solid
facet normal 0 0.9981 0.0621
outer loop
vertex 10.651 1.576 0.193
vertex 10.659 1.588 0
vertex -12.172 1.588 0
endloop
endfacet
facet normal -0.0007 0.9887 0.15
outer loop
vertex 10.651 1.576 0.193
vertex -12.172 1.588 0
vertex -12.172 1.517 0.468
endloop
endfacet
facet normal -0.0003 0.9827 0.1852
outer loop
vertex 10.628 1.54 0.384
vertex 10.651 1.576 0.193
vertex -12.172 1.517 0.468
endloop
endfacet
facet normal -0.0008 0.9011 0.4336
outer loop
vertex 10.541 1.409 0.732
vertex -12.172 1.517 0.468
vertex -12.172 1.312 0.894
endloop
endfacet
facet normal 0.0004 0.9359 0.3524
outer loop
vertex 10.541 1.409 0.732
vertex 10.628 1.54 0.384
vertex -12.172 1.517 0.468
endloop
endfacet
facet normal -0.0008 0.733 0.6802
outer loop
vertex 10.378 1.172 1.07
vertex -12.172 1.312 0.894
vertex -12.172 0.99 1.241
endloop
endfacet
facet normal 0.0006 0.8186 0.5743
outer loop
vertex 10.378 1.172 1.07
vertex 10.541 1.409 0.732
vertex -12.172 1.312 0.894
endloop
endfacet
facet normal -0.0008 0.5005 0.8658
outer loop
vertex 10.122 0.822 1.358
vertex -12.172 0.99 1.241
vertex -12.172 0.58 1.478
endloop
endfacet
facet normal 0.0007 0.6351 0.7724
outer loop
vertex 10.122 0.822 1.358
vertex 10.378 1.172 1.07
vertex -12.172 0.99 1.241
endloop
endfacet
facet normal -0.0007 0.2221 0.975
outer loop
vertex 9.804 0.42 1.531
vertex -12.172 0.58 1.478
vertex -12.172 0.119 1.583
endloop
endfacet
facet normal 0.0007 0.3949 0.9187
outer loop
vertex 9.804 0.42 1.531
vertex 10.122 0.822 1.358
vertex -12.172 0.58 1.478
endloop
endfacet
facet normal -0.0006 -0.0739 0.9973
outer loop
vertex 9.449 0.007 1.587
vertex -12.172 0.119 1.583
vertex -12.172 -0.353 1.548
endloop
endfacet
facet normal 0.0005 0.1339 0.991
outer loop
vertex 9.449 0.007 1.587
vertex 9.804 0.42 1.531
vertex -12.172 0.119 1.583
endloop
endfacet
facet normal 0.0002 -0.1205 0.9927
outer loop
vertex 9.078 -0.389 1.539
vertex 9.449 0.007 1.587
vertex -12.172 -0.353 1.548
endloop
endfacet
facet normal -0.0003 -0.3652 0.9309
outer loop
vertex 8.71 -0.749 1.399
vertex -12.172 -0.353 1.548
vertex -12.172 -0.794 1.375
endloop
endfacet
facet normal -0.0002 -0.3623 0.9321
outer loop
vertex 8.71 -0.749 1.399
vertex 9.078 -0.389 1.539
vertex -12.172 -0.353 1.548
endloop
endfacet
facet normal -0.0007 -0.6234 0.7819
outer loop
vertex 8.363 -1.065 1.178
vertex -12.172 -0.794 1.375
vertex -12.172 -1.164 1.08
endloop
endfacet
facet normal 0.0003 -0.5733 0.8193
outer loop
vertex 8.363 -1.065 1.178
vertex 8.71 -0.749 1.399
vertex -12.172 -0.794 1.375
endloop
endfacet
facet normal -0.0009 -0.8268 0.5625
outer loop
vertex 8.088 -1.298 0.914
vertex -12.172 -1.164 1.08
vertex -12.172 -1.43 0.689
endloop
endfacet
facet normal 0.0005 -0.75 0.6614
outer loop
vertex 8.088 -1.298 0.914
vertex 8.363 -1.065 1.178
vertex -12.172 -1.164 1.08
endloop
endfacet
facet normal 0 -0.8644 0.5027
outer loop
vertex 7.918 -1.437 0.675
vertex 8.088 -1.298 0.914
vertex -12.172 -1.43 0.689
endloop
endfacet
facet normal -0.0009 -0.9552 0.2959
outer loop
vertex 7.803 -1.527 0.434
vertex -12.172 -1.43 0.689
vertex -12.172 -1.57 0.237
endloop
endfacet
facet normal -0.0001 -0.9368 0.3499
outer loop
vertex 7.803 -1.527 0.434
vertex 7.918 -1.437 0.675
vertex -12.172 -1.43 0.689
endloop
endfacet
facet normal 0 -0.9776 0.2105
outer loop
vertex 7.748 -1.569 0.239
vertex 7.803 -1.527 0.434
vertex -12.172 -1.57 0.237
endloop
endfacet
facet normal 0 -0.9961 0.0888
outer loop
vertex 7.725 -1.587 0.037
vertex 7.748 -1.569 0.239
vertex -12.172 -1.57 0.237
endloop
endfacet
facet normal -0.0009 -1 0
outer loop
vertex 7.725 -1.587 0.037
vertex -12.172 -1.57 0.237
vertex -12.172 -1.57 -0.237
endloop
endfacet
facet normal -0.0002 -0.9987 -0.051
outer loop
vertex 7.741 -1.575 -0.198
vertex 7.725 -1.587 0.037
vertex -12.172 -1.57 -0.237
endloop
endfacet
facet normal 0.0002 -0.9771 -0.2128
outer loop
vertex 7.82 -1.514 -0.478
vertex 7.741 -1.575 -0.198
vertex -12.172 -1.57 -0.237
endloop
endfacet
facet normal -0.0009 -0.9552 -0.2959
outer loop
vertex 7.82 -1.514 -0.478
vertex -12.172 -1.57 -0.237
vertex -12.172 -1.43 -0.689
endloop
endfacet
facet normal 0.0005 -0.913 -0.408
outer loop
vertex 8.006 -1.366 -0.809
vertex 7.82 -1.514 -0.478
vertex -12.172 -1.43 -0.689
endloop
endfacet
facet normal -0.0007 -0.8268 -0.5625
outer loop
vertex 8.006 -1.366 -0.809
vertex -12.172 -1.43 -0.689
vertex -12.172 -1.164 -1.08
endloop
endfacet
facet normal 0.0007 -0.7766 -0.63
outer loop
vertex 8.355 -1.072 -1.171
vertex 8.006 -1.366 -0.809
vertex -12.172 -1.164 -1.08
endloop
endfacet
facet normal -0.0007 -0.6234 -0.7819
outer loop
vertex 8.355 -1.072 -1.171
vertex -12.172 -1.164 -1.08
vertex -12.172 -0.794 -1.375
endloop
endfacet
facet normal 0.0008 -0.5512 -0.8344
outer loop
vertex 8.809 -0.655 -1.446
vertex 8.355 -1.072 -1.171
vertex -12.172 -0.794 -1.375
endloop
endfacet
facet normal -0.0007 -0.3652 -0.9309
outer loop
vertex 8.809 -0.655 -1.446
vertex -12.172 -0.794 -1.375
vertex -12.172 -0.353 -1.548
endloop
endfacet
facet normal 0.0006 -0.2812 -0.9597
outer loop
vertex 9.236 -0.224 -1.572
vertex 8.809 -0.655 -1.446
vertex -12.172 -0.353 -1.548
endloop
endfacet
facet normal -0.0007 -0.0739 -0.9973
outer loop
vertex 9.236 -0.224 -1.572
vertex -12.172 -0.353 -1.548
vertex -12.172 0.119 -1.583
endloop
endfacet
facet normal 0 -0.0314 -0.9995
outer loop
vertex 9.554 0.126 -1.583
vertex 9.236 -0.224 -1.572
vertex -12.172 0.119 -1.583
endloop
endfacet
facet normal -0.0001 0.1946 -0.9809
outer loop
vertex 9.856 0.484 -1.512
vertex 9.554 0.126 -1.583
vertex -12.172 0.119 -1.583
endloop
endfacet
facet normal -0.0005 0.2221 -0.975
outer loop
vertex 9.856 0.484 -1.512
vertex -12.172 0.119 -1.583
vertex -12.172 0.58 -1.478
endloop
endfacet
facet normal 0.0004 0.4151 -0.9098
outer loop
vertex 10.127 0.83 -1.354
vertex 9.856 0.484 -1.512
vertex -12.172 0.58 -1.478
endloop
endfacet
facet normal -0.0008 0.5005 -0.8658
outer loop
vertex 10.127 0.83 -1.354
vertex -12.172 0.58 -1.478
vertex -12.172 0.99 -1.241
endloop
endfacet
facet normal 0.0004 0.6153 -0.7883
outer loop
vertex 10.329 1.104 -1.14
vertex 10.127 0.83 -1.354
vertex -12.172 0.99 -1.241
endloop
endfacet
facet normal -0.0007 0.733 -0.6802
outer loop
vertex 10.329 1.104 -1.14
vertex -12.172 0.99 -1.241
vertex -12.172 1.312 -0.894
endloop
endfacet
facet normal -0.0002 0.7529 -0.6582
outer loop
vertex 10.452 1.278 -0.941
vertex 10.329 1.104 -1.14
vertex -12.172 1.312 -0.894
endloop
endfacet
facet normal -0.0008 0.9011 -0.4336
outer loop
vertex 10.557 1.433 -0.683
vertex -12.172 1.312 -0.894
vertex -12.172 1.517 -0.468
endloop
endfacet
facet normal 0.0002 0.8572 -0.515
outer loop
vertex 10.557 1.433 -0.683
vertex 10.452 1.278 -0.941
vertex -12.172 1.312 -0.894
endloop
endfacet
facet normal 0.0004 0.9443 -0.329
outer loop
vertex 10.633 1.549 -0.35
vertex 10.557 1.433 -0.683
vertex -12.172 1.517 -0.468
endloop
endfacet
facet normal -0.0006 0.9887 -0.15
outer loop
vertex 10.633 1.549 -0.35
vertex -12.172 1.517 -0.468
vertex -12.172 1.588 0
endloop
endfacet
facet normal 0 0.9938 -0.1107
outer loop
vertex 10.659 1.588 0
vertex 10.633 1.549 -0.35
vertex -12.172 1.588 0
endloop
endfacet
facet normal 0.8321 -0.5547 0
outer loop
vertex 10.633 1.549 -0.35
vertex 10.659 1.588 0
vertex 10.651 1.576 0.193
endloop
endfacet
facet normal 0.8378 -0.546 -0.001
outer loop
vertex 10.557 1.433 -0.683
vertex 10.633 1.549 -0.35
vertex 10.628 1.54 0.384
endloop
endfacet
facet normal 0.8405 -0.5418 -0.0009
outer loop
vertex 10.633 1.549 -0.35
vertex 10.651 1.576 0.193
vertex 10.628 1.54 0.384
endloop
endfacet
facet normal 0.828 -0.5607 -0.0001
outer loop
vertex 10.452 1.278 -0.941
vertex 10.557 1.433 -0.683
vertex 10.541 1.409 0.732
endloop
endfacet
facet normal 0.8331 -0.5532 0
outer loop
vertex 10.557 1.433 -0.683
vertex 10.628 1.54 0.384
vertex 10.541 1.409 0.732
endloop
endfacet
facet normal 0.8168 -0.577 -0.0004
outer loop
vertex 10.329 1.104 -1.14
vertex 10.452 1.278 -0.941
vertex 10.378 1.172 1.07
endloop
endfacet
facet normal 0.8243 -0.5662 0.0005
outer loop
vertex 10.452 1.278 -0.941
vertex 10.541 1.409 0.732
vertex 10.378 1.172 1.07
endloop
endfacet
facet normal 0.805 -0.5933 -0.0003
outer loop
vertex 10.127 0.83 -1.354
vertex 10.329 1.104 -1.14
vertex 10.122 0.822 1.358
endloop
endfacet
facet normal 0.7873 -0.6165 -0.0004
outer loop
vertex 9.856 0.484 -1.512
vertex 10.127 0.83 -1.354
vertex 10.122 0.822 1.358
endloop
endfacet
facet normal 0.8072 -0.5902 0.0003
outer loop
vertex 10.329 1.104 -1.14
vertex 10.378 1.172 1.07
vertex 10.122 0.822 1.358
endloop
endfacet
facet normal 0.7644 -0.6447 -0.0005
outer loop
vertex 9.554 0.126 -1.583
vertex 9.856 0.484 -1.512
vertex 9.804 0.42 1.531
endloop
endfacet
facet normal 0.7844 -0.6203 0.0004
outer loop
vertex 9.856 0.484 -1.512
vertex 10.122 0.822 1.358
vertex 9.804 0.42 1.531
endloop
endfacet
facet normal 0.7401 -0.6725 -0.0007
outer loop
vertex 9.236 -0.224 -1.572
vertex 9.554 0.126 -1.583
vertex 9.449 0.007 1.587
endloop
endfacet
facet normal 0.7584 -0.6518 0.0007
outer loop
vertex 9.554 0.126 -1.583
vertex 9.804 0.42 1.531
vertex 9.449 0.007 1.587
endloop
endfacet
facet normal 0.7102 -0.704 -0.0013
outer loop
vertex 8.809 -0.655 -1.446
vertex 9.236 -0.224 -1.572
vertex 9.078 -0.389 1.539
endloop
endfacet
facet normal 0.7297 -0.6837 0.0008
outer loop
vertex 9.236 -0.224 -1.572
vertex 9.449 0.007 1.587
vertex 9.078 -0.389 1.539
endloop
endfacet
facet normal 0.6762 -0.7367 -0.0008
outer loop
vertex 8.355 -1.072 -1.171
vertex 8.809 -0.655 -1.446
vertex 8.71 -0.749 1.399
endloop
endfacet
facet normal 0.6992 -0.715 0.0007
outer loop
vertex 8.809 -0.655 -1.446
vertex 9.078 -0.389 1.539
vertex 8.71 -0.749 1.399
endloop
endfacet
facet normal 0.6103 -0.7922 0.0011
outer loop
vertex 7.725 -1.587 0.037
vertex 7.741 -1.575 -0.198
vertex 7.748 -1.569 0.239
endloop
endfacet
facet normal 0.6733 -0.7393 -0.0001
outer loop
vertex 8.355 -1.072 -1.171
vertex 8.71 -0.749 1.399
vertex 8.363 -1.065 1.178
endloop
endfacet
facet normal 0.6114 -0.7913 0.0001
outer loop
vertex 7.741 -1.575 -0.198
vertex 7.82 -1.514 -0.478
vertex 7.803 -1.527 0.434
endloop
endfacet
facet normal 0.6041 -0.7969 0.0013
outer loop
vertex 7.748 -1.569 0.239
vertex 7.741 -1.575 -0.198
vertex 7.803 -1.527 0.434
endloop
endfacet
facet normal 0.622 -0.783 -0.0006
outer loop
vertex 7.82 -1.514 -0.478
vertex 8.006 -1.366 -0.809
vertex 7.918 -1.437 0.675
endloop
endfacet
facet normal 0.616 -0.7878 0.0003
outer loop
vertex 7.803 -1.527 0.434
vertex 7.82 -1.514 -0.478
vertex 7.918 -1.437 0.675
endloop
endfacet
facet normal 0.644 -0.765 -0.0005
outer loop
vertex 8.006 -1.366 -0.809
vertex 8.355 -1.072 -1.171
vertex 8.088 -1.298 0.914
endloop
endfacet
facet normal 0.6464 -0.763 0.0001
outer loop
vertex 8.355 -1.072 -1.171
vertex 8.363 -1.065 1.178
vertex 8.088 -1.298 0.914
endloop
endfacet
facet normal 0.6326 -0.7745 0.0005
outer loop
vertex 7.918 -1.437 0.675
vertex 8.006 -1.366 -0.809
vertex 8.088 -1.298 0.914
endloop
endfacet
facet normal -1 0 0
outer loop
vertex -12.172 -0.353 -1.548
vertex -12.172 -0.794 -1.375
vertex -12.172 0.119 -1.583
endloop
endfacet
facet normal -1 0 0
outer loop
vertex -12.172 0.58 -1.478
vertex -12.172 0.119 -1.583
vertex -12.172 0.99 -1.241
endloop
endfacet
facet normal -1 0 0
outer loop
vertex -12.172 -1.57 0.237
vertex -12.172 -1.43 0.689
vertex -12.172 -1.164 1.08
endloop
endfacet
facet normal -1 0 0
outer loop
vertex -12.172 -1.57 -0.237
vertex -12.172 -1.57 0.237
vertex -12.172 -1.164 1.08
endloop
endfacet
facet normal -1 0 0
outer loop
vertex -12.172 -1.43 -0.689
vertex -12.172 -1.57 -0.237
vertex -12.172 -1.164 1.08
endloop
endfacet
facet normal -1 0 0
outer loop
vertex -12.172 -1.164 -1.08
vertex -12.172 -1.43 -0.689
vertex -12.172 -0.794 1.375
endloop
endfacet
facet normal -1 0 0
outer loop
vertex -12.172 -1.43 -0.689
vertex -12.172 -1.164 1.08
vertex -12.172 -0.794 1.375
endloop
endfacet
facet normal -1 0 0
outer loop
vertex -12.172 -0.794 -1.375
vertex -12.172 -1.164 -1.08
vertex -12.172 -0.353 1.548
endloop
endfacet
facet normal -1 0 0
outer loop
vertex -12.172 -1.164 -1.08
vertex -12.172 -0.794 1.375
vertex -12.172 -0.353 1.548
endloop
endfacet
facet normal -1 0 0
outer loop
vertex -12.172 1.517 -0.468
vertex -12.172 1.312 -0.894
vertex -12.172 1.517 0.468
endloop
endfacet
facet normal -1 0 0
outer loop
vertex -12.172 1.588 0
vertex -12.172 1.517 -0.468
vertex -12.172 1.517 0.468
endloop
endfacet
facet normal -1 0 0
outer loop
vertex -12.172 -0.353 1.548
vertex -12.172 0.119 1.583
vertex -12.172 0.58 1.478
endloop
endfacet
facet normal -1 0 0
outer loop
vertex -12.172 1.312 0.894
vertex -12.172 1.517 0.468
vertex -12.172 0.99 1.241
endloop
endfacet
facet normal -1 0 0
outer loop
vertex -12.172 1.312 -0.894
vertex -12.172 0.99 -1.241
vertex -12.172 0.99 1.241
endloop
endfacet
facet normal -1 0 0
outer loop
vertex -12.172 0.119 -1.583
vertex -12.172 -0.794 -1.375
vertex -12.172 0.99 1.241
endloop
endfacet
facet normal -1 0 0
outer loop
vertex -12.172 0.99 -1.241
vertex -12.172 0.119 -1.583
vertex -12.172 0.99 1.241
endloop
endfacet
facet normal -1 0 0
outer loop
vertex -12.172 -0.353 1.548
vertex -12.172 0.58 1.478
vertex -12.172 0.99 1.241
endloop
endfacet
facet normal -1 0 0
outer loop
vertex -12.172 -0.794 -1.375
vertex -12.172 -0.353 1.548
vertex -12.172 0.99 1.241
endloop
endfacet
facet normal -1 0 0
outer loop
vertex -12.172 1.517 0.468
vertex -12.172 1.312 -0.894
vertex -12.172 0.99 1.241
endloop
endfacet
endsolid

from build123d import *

# Parameters (mm, degrees)
F0_R     = 1.5875
F1_DEPTH = 12.7
F2_W     = 4.18922
F2_H     = 3.175
F3_DEPTH = 1.5875
F4_W     = 3.647596
F4_H     = 5.093468
F4_H_2   = 3.670235
F5_DEPTH = 25.4


with BuildPart() as f1:
    # F0 (on Right) → F1 (new body, symmetric)
    with BuildSketch(Plane.YZ):
        Circle(F0_R)
    extrude(amount=F1_DEPTH, both=True)

    # F2 (on face) → F3 (join)
    with BuildSketch(Plane(origin=(-12.7, 0, 0), x_dir=(0, -1, 0), z_dir=(-1, 0, 0))):
        with Locations((-2.09461, 0)):
            Rectangle(F2_W, F2_H)
    extrude(amount=F3_DEPTH)

    # F4 (on face) → F5 (cut)
    with BuildSketch(Plane.XY.offset(1.5875)):
        with BuildLine():
            ThreePointArc((10.658555, 1.5875), (9.327825, -0.125735), (7.724933, -1.5875))
            Line((7.724933, -1.5875), (12.7, -1.5875))
            Line((12.7, -1.5875), (12.7, 1.5875))
            Line((12.7, 1.5875), (10.658555, 1.5875))
        make_face()
        with Locations((-13.995515, -0.959234)):
            Rectangle(F4_W, F4_H)
        with Locations((-13.995515, 3.422617)):
            Rectangle(F4_W, F4_H_2)
    extrude(amount=-F5_DEPTH, mode=Mode.SUBTRACT)


solid = f1.part
